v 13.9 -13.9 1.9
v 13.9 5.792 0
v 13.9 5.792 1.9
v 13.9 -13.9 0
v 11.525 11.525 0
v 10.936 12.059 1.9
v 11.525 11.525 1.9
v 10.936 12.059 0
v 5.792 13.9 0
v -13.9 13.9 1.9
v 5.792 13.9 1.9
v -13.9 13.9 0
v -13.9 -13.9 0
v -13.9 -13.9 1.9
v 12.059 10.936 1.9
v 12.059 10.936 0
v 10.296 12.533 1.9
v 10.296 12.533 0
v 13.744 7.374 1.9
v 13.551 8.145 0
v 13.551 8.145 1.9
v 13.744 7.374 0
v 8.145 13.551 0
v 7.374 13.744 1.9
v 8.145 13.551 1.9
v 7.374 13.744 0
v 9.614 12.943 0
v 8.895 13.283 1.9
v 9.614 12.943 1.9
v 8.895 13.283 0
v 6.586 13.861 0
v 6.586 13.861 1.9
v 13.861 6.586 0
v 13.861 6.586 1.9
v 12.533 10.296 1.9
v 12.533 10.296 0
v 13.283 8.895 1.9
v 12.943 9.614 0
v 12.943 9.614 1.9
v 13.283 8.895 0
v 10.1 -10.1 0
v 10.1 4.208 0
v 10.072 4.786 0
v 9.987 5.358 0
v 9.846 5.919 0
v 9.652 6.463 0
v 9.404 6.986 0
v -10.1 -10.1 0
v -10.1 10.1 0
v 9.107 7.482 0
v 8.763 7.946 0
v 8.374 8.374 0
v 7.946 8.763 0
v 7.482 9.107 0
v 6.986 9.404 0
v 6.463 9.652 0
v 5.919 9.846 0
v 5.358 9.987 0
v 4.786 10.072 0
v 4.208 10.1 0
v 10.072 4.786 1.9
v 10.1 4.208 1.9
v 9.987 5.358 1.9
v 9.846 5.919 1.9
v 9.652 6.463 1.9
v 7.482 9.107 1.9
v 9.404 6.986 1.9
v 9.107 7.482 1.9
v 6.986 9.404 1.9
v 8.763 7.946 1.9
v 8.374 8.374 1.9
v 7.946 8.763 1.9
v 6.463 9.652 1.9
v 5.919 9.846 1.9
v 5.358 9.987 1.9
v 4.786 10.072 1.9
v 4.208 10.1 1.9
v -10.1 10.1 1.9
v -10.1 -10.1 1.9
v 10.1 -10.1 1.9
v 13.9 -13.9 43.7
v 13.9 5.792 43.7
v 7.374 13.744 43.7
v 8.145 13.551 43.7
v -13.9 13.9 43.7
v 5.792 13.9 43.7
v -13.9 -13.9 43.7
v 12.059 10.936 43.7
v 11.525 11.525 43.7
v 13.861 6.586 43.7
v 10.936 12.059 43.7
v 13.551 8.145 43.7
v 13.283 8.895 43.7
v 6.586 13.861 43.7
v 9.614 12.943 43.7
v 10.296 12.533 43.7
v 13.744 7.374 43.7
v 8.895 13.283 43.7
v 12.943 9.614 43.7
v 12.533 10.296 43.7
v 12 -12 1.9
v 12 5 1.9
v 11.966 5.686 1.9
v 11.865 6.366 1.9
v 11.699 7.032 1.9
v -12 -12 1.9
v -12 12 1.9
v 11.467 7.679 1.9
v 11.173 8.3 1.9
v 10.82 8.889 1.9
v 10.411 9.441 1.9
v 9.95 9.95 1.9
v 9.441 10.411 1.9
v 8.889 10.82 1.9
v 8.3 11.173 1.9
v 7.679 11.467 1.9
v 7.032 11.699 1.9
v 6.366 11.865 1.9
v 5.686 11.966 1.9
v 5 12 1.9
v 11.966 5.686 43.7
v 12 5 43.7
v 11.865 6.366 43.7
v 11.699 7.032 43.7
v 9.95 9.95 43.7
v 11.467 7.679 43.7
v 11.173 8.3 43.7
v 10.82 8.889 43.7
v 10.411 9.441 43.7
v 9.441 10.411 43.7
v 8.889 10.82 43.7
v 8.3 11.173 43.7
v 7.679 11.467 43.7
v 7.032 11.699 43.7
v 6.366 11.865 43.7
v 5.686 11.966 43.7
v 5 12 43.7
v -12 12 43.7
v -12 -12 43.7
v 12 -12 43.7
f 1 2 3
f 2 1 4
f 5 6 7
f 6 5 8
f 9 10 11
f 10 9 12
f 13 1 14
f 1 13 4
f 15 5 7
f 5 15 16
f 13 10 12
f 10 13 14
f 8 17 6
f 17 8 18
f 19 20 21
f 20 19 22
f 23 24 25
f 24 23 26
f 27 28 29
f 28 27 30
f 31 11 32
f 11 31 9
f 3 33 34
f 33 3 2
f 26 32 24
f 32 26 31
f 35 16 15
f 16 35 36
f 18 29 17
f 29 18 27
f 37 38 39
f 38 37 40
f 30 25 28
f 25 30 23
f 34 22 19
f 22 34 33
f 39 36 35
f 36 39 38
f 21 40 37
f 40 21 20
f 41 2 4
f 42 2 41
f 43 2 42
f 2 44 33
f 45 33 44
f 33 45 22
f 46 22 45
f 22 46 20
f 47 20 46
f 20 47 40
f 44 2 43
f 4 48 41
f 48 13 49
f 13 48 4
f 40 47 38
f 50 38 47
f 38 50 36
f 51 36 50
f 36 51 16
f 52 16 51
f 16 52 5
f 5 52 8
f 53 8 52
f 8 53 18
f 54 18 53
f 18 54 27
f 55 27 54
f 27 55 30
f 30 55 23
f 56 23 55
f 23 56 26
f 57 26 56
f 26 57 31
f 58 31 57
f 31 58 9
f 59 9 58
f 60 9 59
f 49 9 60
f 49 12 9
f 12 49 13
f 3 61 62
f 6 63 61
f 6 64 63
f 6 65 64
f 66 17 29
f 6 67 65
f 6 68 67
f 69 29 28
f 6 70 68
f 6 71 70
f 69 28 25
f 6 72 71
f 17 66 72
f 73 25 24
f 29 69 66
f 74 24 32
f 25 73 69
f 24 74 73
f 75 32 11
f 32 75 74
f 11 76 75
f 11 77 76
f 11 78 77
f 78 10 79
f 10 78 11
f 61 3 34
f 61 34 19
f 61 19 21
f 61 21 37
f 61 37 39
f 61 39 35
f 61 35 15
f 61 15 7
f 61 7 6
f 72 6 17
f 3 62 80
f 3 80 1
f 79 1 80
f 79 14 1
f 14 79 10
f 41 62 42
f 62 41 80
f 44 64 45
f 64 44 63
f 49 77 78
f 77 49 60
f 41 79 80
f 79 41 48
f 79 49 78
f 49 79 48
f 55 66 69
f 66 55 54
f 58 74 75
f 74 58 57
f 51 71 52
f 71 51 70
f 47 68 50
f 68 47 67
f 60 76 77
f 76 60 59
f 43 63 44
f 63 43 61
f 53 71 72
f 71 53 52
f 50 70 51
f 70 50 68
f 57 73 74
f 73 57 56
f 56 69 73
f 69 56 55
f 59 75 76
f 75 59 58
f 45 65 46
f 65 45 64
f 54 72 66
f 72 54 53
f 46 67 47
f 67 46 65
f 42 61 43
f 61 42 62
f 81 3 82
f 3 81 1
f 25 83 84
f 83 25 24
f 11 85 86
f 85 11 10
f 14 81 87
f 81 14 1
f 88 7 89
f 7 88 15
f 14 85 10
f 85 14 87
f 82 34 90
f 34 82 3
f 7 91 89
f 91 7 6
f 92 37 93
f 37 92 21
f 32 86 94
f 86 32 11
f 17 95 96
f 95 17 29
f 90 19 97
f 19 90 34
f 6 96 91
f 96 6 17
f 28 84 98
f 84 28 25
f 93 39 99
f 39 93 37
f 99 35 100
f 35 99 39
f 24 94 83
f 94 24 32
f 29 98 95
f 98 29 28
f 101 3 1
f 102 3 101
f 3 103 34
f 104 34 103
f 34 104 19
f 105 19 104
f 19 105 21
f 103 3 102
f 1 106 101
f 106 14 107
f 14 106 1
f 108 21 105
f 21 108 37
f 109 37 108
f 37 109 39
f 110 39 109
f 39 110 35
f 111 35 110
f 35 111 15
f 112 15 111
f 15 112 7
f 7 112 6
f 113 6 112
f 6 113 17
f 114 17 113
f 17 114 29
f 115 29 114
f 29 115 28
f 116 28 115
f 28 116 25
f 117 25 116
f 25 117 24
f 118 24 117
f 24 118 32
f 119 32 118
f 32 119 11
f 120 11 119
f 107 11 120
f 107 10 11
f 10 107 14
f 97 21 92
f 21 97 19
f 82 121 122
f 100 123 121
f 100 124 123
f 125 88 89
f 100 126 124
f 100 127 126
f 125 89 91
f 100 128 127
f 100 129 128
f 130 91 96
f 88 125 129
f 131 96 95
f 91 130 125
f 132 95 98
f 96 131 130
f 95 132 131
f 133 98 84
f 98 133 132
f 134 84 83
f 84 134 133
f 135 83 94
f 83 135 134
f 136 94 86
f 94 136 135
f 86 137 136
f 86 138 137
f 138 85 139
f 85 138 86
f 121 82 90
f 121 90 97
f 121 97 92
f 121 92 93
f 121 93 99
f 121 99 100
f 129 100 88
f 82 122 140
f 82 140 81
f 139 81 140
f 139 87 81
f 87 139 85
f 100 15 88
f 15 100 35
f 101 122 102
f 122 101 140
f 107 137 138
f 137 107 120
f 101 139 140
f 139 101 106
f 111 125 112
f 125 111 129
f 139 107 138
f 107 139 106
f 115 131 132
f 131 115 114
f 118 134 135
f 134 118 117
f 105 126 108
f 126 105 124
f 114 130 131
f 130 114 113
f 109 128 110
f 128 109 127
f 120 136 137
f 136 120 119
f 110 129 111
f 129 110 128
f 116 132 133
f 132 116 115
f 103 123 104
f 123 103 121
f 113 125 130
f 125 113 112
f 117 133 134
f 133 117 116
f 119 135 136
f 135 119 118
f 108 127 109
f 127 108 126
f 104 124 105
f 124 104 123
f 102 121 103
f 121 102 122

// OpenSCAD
// file: measurements.scad
thickness = 1.9;
finger_d = 22;

module holder(h) {
    // Child 0 is the outer shape
    // Child 1 is the inner shape
    // Child 2 is the end-cap hole shape
    // Bottom end
    difference() {
        linear_extrude(thickness) { children(0); }
        translate([0, 0, -1])
            linear_extrude(thickness+2) { children(2); }
    }
    // Main chamber: h + thickness to leave room for the lid.
    translate([0, 0, thickness])
        difference() {
            linear_extrude(h + thickness) { children(0); }
            translate([0, 0, -1])
                linear_extrude(h + thickness + 2) { children(1); }
        }
}

module lid() {
    // Child 0 is the outer shape
    // Child 1 is the inner shape
    // Child 2 is the end-cap hole shape
    // Bottom end
    difference() {
        linear_extrude(thickness) { children(0); }
        translate([0, 0, -1])
            linear_extrude(thickness+2) { children(2); }
    }
    // Cap plug
    translate([0, 0, thickness])
        difference() {
            linear_extrude(thickness) { children(1); }
            translate([0, 0, -1])
                linear_extrude(thickness+2) { children(2); }
        }
}

//
// Discovery Tiles
//

discovery_w = 24;
discovery_count = 21;

function discovery_corner_r(w) = w * 7 / 24;

module discovery_tile_shape(w) {
    r = discovery_corner_r(w);
    translate([-w/2, -w/2]) {
        translate([w-r, w-r])
            circle(r=r, $fn=64);
        square([w-r, w]);
        square([w, w-r]);
    }
}

//
// Ancients
//

ancient_r = 19.5;
ancient_count = 22;

//
// Monotliths/Orbitals
//

monolith_orbital_d = 25.25;
monolith_orbital_count = 22;
// main file
include <measurements.scad>

holder(thickness*discovery_count) {
    discovery_tile_shape(discovery_w + thickness*2);
    discovery_tile_shape(discovery_w);
    discovery_tile_shape(discovery_w - thickness*2);
}
